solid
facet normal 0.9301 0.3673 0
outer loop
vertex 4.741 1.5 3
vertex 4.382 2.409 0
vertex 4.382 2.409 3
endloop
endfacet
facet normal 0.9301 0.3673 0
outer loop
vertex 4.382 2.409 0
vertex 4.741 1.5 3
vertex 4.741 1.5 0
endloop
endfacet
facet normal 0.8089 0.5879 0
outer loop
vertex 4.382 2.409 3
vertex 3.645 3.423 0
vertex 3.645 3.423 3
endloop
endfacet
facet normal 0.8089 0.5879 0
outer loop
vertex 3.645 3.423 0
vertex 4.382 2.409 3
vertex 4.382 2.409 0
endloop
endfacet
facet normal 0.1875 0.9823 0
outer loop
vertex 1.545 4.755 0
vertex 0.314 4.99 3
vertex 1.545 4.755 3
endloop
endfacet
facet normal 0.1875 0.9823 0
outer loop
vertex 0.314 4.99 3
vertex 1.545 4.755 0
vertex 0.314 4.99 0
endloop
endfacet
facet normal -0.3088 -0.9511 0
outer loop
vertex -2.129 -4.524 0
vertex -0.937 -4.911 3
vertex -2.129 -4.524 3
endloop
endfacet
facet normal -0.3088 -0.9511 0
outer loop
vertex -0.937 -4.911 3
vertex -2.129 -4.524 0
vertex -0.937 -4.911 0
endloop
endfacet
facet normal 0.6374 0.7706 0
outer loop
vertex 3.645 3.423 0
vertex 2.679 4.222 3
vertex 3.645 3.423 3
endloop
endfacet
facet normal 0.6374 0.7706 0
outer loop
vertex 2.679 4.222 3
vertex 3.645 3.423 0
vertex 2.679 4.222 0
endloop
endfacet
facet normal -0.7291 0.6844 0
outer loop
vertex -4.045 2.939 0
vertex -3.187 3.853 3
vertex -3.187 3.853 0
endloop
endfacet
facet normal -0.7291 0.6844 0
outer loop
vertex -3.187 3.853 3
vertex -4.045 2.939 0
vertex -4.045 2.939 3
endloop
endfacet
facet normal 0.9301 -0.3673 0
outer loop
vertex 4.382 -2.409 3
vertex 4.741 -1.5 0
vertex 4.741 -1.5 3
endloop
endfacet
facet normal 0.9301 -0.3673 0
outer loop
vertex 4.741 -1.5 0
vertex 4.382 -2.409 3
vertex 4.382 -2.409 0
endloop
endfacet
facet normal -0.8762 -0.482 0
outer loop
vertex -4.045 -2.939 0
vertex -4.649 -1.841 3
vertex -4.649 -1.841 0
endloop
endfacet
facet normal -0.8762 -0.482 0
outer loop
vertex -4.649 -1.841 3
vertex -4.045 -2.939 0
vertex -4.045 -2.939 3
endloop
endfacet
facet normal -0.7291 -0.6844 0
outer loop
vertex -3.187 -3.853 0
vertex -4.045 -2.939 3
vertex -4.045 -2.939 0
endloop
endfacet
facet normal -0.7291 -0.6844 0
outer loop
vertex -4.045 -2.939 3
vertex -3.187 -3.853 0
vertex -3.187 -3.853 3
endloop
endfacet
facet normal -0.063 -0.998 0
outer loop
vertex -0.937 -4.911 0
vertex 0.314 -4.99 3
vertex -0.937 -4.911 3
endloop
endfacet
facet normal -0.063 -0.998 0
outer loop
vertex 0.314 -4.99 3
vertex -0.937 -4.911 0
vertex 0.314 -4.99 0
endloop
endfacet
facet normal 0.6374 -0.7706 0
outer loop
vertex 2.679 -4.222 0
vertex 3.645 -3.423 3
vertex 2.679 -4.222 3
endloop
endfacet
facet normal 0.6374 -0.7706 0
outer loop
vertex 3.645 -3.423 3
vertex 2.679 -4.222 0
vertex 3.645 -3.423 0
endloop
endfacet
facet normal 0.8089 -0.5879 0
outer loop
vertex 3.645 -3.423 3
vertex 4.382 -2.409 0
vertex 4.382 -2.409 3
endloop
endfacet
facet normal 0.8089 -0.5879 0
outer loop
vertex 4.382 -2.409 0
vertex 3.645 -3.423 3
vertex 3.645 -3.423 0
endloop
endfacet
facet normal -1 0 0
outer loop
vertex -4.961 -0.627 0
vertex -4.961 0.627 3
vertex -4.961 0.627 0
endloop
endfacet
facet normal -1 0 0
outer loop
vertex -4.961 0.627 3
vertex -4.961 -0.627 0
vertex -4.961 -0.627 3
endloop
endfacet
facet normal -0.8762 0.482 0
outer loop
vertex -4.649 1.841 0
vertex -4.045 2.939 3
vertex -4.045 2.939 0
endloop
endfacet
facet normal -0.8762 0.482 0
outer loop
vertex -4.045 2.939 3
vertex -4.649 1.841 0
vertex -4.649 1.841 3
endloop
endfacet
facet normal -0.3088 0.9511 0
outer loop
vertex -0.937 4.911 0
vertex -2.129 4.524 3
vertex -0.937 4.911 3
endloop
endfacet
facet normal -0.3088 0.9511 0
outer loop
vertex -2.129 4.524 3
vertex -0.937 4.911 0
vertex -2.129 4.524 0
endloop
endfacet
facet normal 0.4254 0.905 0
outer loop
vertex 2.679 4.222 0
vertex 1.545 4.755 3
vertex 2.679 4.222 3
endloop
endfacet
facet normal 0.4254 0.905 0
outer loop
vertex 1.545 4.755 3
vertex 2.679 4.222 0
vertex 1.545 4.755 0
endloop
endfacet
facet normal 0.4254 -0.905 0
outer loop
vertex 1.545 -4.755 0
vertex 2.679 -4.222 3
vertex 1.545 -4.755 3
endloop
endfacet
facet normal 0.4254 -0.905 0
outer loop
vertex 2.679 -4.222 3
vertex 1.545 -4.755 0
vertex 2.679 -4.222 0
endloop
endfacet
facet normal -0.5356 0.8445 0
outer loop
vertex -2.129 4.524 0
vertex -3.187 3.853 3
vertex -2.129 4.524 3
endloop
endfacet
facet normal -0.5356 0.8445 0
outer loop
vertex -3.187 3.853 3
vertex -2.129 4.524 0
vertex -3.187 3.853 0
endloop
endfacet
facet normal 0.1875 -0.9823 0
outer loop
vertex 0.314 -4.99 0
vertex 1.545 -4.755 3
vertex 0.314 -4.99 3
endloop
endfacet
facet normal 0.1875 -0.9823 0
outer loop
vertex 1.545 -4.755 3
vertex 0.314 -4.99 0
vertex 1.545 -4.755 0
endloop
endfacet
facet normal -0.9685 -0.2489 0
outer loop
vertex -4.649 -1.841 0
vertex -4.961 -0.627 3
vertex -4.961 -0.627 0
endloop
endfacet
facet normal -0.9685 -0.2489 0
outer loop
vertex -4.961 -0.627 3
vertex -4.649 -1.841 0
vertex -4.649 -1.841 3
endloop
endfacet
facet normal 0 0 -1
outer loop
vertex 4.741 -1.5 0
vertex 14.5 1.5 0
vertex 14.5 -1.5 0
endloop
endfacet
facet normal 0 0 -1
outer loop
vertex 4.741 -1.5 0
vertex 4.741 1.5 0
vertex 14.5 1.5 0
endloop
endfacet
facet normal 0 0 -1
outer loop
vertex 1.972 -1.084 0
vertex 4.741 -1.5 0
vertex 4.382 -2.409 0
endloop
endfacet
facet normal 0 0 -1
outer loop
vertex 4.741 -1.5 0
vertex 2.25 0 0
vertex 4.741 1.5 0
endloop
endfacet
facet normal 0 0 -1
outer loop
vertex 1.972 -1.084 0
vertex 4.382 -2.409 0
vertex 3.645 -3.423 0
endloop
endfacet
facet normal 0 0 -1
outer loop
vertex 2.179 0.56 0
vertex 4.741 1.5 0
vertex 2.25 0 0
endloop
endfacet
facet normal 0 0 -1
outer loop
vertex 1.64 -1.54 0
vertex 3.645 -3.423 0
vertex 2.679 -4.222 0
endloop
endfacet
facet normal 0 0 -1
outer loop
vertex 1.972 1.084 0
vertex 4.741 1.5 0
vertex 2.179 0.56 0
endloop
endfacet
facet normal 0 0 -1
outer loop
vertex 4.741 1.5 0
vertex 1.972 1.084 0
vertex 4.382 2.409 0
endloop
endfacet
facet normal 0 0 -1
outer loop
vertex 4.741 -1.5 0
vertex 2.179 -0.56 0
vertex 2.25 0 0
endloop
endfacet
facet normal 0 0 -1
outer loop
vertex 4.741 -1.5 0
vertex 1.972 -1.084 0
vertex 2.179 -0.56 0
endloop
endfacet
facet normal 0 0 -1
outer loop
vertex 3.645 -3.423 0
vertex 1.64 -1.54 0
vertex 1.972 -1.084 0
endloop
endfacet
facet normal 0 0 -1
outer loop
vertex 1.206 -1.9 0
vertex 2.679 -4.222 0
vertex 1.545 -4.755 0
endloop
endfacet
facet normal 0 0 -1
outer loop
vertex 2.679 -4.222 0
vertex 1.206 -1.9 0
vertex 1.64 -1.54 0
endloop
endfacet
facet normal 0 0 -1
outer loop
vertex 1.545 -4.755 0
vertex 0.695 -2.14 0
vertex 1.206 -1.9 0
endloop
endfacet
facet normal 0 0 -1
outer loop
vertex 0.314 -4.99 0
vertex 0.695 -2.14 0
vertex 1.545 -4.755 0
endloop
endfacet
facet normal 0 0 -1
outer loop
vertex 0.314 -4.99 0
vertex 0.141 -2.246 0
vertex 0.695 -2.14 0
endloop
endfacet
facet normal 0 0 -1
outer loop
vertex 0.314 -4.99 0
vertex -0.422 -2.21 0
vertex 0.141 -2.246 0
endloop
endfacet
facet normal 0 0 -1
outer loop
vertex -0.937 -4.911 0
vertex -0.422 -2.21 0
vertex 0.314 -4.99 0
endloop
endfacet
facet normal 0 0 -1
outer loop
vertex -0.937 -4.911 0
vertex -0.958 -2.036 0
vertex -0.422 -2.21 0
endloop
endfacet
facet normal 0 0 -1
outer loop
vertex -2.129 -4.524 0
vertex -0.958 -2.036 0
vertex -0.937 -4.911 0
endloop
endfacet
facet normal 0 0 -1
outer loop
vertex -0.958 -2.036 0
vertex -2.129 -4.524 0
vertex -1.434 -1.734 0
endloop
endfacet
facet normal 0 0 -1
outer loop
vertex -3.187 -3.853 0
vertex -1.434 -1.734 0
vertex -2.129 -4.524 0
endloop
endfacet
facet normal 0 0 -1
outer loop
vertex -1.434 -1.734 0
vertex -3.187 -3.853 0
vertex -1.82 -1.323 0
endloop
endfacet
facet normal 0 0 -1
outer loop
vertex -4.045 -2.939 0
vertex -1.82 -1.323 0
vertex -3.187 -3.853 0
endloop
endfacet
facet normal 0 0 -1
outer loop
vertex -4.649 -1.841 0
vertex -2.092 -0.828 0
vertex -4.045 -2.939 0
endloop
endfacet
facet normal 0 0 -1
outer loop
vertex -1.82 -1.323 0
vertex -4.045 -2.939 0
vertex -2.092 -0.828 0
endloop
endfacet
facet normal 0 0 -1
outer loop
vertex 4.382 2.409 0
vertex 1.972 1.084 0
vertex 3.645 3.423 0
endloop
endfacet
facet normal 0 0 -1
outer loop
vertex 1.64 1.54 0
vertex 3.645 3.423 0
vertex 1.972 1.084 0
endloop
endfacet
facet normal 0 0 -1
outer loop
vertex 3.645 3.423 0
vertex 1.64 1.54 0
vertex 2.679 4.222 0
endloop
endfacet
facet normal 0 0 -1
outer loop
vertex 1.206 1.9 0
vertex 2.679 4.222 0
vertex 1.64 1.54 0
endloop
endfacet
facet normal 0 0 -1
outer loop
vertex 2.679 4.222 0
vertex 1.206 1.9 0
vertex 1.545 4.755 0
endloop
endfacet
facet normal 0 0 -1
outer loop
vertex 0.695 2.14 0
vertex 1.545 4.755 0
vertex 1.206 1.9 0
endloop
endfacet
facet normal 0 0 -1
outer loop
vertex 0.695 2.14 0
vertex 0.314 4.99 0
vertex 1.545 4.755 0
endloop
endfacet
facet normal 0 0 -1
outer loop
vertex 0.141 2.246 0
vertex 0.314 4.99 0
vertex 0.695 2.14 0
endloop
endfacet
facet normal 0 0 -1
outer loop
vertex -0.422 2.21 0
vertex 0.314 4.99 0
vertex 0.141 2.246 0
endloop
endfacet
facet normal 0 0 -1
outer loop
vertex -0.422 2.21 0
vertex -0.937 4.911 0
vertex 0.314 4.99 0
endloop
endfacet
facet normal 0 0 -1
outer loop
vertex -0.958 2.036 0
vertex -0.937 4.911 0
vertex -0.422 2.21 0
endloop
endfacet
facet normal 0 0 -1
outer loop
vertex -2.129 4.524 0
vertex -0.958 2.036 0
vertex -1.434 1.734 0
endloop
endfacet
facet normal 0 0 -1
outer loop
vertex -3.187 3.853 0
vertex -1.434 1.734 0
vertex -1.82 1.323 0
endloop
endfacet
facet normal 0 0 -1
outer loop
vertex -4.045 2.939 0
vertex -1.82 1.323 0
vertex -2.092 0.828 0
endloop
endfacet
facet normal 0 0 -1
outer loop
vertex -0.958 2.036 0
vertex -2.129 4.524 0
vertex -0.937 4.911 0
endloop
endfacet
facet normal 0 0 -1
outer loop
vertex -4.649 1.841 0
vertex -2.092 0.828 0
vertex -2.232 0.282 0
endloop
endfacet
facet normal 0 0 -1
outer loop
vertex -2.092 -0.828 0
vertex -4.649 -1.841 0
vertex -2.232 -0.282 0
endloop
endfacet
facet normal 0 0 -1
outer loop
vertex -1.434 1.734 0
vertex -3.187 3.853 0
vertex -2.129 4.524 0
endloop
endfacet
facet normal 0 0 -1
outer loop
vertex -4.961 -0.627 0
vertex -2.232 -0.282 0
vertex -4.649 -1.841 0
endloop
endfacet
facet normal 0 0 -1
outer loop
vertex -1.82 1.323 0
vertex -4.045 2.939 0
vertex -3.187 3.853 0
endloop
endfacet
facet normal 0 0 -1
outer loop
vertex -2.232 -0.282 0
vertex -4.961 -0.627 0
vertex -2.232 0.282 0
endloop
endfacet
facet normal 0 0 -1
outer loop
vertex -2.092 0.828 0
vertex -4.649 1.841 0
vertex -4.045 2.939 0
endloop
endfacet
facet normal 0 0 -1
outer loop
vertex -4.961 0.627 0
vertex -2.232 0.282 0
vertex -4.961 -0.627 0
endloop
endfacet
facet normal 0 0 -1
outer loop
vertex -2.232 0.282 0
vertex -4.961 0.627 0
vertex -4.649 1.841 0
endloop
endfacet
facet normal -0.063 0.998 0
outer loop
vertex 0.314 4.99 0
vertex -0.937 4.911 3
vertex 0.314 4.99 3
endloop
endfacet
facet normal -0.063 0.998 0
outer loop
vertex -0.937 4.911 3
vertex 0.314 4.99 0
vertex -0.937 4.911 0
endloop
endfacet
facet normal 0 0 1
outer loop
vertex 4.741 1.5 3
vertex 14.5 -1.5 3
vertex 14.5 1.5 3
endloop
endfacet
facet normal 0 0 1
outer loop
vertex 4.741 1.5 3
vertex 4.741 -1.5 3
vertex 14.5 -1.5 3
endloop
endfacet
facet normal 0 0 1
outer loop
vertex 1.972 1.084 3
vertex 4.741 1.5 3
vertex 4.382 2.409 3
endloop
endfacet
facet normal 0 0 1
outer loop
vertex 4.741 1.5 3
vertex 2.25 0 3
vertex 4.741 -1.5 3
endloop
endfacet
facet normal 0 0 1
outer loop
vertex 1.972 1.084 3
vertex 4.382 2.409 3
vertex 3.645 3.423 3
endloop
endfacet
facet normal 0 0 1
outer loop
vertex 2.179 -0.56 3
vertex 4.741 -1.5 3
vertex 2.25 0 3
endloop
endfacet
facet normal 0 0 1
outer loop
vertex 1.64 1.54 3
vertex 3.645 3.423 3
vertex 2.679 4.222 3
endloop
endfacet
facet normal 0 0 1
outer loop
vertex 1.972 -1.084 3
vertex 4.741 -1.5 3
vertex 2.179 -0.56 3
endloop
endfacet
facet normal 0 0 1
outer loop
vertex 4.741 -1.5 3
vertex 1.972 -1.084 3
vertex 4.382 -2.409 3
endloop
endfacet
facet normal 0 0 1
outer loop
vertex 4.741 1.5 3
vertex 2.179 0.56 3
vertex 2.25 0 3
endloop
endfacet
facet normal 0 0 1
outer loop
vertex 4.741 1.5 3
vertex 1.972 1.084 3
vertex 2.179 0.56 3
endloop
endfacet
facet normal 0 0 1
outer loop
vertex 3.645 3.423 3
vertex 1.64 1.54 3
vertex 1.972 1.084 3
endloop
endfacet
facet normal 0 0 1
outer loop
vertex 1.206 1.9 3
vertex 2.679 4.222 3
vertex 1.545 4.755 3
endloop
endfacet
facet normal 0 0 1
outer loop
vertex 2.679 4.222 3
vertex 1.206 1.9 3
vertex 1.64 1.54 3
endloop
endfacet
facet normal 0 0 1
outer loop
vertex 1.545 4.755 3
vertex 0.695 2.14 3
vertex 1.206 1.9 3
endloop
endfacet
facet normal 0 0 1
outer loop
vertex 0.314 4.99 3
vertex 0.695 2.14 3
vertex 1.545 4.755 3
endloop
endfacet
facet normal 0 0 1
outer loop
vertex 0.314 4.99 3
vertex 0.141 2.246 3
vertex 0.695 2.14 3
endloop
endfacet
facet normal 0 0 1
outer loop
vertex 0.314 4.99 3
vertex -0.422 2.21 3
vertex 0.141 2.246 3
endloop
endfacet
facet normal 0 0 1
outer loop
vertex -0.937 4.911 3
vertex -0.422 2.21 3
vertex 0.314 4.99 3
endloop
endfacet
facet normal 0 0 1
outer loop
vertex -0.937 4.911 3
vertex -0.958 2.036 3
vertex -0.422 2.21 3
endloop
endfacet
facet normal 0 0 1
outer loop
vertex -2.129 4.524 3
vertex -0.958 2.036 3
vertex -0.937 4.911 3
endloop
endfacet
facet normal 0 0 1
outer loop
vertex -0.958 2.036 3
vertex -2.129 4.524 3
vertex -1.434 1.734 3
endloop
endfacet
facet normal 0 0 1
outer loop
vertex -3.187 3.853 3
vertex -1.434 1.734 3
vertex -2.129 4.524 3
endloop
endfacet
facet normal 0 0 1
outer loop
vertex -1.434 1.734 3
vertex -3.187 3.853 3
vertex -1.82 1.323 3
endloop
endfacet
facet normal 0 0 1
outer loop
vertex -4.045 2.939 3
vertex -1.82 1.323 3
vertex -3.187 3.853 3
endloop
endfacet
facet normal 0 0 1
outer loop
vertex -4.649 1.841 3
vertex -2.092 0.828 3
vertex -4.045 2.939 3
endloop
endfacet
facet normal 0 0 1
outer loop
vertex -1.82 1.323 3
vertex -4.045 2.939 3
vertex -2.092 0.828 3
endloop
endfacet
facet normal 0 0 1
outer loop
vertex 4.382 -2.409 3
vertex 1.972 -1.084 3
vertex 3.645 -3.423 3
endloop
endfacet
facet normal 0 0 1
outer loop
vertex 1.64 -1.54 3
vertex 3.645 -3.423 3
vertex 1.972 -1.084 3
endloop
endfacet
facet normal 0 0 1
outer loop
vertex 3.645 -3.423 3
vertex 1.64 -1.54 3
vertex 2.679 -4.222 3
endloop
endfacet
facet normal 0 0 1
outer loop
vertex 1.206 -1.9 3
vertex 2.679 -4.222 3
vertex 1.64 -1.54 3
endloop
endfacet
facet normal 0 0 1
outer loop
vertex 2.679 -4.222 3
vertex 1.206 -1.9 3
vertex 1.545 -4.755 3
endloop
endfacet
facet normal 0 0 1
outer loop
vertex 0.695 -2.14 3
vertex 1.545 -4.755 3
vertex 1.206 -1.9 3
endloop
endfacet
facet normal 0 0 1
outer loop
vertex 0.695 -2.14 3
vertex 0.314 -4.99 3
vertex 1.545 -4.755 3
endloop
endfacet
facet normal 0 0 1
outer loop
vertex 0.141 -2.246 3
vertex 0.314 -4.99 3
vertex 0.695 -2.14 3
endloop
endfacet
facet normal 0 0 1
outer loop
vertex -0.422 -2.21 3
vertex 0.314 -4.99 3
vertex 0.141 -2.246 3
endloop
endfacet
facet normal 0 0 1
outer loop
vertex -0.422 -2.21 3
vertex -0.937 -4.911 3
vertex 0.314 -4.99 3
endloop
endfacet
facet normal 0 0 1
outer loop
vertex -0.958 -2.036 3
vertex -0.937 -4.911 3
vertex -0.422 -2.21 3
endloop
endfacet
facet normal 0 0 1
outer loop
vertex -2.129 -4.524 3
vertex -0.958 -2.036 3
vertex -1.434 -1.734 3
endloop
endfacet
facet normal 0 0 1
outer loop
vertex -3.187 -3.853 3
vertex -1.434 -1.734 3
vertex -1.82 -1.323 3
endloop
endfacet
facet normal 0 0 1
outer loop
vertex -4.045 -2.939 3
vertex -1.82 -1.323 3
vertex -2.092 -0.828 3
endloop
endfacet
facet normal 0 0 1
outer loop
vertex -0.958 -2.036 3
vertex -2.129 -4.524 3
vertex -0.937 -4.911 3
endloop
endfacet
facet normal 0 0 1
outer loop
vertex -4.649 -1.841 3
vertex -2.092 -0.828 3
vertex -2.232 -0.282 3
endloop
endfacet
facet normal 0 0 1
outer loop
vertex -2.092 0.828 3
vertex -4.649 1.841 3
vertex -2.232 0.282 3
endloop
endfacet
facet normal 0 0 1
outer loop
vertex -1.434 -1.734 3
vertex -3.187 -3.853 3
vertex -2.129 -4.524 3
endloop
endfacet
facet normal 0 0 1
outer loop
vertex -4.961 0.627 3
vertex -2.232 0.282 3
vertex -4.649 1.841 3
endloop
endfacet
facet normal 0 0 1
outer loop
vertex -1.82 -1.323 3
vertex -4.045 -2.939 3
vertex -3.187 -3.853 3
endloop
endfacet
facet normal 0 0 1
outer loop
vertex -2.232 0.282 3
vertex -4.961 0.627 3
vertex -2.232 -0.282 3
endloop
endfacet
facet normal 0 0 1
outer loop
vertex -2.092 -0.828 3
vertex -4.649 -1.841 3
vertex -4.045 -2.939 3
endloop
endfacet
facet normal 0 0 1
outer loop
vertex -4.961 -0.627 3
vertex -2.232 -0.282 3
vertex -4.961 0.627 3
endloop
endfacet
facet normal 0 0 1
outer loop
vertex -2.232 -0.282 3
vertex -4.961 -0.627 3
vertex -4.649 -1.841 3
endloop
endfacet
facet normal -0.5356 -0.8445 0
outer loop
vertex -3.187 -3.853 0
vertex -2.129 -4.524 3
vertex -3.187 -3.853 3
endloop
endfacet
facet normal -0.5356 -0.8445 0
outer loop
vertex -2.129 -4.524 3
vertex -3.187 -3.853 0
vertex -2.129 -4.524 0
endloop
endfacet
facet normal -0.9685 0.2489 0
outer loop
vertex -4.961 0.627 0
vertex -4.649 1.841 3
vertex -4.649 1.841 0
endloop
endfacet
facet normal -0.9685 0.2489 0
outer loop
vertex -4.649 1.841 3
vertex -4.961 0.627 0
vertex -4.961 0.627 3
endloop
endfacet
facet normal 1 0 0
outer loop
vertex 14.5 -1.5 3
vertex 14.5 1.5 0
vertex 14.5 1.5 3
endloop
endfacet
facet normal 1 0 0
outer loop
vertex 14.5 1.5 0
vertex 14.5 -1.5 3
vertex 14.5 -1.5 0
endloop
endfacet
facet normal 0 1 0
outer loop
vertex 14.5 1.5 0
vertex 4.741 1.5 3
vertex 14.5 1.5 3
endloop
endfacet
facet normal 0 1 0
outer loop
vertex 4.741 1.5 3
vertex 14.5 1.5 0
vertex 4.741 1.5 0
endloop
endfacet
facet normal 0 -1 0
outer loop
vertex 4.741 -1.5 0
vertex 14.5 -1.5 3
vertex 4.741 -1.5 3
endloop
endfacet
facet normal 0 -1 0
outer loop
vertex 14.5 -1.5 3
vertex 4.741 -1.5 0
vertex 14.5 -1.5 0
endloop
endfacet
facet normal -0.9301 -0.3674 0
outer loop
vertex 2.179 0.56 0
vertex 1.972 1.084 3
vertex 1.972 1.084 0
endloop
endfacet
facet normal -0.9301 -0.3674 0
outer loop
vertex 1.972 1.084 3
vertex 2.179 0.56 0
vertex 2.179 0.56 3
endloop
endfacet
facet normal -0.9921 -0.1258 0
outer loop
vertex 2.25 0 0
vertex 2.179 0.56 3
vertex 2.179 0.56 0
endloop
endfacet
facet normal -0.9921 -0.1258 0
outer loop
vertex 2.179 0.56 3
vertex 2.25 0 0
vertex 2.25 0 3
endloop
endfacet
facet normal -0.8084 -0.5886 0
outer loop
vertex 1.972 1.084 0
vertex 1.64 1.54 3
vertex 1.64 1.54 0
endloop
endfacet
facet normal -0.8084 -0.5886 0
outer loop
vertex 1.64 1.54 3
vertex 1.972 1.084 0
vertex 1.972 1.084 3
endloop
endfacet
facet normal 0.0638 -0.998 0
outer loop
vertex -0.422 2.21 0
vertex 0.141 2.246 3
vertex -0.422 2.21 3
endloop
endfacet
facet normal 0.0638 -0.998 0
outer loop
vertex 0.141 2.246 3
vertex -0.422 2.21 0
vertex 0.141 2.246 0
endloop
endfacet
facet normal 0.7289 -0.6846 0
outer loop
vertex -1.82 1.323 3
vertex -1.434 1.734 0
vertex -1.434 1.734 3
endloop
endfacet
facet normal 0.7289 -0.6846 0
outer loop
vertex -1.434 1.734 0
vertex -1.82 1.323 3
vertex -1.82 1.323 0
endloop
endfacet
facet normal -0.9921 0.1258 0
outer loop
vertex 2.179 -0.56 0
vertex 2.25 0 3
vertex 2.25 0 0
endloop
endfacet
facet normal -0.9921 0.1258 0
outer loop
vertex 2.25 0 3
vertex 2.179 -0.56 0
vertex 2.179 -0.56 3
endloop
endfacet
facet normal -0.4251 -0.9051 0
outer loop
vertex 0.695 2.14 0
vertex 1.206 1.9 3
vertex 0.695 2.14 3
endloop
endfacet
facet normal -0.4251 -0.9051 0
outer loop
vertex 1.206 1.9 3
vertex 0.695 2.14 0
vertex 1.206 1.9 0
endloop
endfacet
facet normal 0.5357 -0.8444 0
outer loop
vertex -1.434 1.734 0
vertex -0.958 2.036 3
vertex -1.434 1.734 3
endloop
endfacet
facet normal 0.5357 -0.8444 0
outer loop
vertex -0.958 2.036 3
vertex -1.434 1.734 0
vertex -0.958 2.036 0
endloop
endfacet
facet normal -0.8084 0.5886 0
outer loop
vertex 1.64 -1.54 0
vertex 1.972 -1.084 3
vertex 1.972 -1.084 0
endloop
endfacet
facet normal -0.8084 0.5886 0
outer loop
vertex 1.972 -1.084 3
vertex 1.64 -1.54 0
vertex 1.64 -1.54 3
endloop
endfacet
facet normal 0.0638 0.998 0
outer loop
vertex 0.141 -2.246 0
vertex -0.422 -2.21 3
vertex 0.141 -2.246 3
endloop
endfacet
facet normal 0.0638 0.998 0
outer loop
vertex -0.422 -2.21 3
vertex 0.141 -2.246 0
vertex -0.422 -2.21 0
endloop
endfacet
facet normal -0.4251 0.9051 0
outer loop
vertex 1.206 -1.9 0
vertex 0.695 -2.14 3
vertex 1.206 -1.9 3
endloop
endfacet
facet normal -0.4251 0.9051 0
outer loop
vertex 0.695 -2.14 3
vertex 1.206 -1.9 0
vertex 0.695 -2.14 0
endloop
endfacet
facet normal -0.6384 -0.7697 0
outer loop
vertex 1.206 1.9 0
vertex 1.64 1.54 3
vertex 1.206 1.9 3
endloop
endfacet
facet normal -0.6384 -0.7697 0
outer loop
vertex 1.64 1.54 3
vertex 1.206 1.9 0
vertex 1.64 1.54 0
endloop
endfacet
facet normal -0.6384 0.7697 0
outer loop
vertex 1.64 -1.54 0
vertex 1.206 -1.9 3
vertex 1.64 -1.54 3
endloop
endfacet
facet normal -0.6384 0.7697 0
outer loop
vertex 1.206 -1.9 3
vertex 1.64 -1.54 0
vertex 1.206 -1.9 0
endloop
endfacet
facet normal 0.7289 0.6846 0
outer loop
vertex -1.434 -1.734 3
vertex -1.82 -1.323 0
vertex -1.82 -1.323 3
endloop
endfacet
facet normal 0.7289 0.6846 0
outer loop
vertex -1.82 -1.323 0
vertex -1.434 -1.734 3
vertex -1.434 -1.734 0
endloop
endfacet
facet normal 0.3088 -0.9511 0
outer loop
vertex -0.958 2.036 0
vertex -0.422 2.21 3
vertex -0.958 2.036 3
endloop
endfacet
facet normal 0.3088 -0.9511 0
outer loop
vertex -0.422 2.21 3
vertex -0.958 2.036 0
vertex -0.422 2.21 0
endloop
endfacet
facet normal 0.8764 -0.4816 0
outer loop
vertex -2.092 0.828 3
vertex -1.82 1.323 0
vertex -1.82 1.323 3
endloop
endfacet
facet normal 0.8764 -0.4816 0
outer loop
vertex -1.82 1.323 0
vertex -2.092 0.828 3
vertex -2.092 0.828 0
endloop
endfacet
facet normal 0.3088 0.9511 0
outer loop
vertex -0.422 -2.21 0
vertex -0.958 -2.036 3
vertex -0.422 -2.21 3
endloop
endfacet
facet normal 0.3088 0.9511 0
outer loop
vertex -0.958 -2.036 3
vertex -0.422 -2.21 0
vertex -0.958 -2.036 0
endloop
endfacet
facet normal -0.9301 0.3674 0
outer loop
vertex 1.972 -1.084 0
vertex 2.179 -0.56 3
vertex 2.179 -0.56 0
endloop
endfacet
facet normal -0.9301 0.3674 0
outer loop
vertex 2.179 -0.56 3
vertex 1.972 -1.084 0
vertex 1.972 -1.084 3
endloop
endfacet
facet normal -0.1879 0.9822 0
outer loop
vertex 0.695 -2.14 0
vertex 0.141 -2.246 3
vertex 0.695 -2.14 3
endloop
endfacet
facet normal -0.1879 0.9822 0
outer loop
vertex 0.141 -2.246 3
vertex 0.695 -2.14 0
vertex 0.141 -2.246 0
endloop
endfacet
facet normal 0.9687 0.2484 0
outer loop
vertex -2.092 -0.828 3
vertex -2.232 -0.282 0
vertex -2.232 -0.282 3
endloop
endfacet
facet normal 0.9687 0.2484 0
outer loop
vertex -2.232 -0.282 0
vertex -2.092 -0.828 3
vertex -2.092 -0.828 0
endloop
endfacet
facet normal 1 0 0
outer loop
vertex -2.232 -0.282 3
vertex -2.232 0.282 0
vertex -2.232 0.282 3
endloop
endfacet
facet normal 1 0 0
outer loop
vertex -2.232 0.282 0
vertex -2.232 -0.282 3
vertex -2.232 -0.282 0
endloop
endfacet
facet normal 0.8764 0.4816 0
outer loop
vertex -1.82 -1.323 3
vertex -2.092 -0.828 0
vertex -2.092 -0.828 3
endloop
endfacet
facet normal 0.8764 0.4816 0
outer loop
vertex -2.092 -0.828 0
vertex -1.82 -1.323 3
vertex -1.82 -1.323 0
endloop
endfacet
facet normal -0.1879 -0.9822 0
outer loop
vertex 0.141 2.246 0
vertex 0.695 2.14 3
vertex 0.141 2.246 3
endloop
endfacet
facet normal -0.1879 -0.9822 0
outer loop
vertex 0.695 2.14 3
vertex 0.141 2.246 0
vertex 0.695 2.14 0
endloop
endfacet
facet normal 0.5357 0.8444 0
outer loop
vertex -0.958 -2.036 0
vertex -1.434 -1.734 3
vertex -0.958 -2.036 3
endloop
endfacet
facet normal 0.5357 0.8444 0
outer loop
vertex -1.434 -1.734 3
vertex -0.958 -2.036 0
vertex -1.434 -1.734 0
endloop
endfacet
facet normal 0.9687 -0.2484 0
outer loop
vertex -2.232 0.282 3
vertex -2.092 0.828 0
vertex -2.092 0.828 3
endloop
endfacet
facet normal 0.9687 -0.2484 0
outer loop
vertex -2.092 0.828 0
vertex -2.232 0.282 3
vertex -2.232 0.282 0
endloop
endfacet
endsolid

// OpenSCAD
$fn = 25;
bolt_hole = 4.5;
finger_dia = 3;
flange_od = 10;
flange_thk = finger_dia;
finger_length = 10;

difference()
{
    union()
    {
        //flange
        cylinder(d=flange_od, h=flange_thk);
        
        //finger
        translate([bolt_hole,-finger_dia/2,0])
            cube([finger_length,finger_dia,finger_dia]);
    }

cylinder(d=bolt_hole,h=flange_thk);
}
